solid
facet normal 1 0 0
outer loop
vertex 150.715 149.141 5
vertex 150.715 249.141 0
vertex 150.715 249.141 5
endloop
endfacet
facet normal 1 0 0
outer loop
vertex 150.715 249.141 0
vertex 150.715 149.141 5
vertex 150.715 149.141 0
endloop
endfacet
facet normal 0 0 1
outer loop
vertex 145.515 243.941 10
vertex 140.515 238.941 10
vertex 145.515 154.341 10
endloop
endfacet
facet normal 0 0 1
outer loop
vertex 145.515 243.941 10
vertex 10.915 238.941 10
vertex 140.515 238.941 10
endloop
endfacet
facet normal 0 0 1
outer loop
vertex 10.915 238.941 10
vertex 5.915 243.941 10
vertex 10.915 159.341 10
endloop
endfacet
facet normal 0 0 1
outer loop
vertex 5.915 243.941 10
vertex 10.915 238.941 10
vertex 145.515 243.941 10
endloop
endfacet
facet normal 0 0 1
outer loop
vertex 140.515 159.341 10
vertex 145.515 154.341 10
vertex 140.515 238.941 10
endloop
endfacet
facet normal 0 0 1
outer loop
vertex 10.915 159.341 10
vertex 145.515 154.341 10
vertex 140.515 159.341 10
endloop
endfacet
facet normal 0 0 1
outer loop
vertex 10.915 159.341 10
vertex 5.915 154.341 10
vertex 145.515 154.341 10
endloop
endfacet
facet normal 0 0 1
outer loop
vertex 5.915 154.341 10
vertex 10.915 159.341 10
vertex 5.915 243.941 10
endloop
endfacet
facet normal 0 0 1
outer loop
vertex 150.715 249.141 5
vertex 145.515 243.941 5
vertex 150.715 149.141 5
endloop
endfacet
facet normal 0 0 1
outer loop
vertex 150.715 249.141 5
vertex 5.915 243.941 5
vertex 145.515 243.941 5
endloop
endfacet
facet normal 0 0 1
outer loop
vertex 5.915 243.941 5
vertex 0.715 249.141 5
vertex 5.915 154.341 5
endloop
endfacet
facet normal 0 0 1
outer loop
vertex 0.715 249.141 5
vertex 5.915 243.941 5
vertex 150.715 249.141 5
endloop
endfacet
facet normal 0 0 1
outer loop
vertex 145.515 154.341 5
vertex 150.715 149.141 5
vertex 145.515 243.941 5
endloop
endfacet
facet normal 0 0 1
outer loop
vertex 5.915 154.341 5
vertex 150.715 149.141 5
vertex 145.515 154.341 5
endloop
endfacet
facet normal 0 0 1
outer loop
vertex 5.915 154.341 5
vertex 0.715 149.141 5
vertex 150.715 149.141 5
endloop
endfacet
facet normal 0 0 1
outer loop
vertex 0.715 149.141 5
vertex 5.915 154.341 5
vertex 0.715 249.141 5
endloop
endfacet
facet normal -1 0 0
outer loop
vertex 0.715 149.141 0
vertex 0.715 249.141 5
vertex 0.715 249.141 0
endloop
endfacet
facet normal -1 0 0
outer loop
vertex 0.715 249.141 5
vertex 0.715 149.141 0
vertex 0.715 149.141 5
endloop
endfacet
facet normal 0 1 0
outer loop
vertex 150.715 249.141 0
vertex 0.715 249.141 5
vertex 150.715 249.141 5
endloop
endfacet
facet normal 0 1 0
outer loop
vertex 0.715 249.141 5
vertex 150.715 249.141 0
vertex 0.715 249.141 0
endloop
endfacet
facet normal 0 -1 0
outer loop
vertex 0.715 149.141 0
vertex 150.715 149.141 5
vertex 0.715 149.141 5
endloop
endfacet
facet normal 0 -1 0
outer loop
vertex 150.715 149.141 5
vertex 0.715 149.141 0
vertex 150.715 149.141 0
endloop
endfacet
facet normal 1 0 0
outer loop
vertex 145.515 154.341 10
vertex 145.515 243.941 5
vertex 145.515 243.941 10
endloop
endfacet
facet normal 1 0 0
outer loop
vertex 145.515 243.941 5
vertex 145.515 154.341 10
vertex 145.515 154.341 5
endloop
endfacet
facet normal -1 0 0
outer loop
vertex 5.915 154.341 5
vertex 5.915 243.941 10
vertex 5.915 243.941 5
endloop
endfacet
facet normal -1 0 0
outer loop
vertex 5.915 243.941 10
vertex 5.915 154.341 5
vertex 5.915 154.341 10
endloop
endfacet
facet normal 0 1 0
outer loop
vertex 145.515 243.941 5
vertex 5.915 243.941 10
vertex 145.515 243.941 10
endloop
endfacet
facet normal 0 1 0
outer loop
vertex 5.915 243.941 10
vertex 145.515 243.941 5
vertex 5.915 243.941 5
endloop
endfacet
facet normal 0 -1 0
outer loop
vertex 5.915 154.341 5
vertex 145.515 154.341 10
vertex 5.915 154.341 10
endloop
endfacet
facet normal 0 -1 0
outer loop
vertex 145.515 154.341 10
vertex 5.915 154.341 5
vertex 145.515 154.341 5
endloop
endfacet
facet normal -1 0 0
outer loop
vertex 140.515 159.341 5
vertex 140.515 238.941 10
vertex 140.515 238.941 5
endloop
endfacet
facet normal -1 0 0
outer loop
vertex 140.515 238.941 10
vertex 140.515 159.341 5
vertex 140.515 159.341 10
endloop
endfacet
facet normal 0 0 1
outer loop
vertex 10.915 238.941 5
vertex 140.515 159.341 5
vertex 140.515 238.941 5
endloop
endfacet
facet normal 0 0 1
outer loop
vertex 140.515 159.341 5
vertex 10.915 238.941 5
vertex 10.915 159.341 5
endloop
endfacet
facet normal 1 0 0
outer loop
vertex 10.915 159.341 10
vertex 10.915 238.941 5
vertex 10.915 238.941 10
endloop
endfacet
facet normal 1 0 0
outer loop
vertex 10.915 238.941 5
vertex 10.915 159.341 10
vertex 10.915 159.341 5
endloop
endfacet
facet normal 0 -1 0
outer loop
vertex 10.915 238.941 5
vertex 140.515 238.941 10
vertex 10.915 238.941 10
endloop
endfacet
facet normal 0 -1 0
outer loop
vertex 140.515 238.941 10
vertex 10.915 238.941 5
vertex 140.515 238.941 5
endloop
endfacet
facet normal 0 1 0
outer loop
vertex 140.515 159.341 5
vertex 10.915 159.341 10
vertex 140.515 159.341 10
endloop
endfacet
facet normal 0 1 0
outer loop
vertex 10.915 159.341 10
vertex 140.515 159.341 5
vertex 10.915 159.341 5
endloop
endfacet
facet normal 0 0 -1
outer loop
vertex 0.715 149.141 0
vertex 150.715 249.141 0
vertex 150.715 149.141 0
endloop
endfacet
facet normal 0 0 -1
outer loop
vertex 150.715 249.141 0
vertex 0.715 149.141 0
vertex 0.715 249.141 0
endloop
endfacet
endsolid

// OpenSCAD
difference() {
  translate([75.7152502500, 199.1410000000, 5.0000000000]) {
    scale([150.0000000000, 100.0000000000, 10.0000000000]) {
      translate([-0.5000000000, -0.5000000000, -0.5000000000]) {
        cube([1, 1, 1]);
      }
    }
  }
  union() {
    difference() {
      translate([75.7152502500, 199.1410000000, 7.5000000000]) {
        scale([150.0000000000, 100.0000000000, 5.0000000000]) {
          translate([-0.5000000000, -0.5000000000, -0.5000000000]) {
            cube([1, 1, 1]);
          }
        }
      }
      translate([75.7150000000, 199.1410000000, 7.5000000000]) {
        scale([139.6000000000, 89.6000000000, 5.0000000000]) {
          translate([-0.5000000000, -0.5000000000, -0.5000000000]) {
            cube([1, 1, 1]);
          }
        }
      }
    }
    translate([75.7150000000, 199.1410000000, 7.5000000000]) {
      scale([129.6000000000, 79.6000000000, 5.0000000000]) {
        translate([-0.5000000000, -0.5000000000, -0.5000000000]) {
          cube([1, 1, 1]);
        }
      }
    }
  }
}
